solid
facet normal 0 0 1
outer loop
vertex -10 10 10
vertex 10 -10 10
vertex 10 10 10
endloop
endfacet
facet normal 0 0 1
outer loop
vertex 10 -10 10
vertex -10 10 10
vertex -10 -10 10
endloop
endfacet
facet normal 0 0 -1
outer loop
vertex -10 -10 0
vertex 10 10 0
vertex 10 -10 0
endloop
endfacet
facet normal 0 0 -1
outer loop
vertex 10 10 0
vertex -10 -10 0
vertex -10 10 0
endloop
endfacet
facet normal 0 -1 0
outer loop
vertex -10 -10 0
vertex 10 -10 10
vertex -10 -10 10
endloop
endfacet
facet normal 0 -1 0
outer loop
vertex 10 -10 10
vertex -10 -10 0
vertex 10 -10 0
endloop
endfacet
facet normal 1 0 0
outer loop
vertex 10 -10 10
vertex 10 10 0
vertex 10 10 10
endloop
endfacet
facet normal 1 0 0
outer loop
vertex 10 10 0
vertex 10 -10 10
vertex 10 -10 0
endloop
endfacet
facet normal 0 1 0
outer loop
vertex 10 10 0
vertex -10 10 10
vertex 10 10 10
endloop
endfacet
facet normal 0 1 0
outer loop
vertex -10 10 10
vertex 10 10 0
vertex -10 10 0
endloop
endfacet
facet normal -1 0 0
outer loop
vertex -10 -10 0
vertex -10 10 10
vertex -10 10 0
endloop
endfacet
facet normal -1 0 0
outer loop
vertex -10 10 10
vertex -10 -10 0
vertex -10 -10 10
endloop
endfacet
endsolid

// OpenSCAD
//-- Cube's height. Configure it as you want
height=10;

translate([0,0,height/2])
  cube([20,20,height], center=true);
